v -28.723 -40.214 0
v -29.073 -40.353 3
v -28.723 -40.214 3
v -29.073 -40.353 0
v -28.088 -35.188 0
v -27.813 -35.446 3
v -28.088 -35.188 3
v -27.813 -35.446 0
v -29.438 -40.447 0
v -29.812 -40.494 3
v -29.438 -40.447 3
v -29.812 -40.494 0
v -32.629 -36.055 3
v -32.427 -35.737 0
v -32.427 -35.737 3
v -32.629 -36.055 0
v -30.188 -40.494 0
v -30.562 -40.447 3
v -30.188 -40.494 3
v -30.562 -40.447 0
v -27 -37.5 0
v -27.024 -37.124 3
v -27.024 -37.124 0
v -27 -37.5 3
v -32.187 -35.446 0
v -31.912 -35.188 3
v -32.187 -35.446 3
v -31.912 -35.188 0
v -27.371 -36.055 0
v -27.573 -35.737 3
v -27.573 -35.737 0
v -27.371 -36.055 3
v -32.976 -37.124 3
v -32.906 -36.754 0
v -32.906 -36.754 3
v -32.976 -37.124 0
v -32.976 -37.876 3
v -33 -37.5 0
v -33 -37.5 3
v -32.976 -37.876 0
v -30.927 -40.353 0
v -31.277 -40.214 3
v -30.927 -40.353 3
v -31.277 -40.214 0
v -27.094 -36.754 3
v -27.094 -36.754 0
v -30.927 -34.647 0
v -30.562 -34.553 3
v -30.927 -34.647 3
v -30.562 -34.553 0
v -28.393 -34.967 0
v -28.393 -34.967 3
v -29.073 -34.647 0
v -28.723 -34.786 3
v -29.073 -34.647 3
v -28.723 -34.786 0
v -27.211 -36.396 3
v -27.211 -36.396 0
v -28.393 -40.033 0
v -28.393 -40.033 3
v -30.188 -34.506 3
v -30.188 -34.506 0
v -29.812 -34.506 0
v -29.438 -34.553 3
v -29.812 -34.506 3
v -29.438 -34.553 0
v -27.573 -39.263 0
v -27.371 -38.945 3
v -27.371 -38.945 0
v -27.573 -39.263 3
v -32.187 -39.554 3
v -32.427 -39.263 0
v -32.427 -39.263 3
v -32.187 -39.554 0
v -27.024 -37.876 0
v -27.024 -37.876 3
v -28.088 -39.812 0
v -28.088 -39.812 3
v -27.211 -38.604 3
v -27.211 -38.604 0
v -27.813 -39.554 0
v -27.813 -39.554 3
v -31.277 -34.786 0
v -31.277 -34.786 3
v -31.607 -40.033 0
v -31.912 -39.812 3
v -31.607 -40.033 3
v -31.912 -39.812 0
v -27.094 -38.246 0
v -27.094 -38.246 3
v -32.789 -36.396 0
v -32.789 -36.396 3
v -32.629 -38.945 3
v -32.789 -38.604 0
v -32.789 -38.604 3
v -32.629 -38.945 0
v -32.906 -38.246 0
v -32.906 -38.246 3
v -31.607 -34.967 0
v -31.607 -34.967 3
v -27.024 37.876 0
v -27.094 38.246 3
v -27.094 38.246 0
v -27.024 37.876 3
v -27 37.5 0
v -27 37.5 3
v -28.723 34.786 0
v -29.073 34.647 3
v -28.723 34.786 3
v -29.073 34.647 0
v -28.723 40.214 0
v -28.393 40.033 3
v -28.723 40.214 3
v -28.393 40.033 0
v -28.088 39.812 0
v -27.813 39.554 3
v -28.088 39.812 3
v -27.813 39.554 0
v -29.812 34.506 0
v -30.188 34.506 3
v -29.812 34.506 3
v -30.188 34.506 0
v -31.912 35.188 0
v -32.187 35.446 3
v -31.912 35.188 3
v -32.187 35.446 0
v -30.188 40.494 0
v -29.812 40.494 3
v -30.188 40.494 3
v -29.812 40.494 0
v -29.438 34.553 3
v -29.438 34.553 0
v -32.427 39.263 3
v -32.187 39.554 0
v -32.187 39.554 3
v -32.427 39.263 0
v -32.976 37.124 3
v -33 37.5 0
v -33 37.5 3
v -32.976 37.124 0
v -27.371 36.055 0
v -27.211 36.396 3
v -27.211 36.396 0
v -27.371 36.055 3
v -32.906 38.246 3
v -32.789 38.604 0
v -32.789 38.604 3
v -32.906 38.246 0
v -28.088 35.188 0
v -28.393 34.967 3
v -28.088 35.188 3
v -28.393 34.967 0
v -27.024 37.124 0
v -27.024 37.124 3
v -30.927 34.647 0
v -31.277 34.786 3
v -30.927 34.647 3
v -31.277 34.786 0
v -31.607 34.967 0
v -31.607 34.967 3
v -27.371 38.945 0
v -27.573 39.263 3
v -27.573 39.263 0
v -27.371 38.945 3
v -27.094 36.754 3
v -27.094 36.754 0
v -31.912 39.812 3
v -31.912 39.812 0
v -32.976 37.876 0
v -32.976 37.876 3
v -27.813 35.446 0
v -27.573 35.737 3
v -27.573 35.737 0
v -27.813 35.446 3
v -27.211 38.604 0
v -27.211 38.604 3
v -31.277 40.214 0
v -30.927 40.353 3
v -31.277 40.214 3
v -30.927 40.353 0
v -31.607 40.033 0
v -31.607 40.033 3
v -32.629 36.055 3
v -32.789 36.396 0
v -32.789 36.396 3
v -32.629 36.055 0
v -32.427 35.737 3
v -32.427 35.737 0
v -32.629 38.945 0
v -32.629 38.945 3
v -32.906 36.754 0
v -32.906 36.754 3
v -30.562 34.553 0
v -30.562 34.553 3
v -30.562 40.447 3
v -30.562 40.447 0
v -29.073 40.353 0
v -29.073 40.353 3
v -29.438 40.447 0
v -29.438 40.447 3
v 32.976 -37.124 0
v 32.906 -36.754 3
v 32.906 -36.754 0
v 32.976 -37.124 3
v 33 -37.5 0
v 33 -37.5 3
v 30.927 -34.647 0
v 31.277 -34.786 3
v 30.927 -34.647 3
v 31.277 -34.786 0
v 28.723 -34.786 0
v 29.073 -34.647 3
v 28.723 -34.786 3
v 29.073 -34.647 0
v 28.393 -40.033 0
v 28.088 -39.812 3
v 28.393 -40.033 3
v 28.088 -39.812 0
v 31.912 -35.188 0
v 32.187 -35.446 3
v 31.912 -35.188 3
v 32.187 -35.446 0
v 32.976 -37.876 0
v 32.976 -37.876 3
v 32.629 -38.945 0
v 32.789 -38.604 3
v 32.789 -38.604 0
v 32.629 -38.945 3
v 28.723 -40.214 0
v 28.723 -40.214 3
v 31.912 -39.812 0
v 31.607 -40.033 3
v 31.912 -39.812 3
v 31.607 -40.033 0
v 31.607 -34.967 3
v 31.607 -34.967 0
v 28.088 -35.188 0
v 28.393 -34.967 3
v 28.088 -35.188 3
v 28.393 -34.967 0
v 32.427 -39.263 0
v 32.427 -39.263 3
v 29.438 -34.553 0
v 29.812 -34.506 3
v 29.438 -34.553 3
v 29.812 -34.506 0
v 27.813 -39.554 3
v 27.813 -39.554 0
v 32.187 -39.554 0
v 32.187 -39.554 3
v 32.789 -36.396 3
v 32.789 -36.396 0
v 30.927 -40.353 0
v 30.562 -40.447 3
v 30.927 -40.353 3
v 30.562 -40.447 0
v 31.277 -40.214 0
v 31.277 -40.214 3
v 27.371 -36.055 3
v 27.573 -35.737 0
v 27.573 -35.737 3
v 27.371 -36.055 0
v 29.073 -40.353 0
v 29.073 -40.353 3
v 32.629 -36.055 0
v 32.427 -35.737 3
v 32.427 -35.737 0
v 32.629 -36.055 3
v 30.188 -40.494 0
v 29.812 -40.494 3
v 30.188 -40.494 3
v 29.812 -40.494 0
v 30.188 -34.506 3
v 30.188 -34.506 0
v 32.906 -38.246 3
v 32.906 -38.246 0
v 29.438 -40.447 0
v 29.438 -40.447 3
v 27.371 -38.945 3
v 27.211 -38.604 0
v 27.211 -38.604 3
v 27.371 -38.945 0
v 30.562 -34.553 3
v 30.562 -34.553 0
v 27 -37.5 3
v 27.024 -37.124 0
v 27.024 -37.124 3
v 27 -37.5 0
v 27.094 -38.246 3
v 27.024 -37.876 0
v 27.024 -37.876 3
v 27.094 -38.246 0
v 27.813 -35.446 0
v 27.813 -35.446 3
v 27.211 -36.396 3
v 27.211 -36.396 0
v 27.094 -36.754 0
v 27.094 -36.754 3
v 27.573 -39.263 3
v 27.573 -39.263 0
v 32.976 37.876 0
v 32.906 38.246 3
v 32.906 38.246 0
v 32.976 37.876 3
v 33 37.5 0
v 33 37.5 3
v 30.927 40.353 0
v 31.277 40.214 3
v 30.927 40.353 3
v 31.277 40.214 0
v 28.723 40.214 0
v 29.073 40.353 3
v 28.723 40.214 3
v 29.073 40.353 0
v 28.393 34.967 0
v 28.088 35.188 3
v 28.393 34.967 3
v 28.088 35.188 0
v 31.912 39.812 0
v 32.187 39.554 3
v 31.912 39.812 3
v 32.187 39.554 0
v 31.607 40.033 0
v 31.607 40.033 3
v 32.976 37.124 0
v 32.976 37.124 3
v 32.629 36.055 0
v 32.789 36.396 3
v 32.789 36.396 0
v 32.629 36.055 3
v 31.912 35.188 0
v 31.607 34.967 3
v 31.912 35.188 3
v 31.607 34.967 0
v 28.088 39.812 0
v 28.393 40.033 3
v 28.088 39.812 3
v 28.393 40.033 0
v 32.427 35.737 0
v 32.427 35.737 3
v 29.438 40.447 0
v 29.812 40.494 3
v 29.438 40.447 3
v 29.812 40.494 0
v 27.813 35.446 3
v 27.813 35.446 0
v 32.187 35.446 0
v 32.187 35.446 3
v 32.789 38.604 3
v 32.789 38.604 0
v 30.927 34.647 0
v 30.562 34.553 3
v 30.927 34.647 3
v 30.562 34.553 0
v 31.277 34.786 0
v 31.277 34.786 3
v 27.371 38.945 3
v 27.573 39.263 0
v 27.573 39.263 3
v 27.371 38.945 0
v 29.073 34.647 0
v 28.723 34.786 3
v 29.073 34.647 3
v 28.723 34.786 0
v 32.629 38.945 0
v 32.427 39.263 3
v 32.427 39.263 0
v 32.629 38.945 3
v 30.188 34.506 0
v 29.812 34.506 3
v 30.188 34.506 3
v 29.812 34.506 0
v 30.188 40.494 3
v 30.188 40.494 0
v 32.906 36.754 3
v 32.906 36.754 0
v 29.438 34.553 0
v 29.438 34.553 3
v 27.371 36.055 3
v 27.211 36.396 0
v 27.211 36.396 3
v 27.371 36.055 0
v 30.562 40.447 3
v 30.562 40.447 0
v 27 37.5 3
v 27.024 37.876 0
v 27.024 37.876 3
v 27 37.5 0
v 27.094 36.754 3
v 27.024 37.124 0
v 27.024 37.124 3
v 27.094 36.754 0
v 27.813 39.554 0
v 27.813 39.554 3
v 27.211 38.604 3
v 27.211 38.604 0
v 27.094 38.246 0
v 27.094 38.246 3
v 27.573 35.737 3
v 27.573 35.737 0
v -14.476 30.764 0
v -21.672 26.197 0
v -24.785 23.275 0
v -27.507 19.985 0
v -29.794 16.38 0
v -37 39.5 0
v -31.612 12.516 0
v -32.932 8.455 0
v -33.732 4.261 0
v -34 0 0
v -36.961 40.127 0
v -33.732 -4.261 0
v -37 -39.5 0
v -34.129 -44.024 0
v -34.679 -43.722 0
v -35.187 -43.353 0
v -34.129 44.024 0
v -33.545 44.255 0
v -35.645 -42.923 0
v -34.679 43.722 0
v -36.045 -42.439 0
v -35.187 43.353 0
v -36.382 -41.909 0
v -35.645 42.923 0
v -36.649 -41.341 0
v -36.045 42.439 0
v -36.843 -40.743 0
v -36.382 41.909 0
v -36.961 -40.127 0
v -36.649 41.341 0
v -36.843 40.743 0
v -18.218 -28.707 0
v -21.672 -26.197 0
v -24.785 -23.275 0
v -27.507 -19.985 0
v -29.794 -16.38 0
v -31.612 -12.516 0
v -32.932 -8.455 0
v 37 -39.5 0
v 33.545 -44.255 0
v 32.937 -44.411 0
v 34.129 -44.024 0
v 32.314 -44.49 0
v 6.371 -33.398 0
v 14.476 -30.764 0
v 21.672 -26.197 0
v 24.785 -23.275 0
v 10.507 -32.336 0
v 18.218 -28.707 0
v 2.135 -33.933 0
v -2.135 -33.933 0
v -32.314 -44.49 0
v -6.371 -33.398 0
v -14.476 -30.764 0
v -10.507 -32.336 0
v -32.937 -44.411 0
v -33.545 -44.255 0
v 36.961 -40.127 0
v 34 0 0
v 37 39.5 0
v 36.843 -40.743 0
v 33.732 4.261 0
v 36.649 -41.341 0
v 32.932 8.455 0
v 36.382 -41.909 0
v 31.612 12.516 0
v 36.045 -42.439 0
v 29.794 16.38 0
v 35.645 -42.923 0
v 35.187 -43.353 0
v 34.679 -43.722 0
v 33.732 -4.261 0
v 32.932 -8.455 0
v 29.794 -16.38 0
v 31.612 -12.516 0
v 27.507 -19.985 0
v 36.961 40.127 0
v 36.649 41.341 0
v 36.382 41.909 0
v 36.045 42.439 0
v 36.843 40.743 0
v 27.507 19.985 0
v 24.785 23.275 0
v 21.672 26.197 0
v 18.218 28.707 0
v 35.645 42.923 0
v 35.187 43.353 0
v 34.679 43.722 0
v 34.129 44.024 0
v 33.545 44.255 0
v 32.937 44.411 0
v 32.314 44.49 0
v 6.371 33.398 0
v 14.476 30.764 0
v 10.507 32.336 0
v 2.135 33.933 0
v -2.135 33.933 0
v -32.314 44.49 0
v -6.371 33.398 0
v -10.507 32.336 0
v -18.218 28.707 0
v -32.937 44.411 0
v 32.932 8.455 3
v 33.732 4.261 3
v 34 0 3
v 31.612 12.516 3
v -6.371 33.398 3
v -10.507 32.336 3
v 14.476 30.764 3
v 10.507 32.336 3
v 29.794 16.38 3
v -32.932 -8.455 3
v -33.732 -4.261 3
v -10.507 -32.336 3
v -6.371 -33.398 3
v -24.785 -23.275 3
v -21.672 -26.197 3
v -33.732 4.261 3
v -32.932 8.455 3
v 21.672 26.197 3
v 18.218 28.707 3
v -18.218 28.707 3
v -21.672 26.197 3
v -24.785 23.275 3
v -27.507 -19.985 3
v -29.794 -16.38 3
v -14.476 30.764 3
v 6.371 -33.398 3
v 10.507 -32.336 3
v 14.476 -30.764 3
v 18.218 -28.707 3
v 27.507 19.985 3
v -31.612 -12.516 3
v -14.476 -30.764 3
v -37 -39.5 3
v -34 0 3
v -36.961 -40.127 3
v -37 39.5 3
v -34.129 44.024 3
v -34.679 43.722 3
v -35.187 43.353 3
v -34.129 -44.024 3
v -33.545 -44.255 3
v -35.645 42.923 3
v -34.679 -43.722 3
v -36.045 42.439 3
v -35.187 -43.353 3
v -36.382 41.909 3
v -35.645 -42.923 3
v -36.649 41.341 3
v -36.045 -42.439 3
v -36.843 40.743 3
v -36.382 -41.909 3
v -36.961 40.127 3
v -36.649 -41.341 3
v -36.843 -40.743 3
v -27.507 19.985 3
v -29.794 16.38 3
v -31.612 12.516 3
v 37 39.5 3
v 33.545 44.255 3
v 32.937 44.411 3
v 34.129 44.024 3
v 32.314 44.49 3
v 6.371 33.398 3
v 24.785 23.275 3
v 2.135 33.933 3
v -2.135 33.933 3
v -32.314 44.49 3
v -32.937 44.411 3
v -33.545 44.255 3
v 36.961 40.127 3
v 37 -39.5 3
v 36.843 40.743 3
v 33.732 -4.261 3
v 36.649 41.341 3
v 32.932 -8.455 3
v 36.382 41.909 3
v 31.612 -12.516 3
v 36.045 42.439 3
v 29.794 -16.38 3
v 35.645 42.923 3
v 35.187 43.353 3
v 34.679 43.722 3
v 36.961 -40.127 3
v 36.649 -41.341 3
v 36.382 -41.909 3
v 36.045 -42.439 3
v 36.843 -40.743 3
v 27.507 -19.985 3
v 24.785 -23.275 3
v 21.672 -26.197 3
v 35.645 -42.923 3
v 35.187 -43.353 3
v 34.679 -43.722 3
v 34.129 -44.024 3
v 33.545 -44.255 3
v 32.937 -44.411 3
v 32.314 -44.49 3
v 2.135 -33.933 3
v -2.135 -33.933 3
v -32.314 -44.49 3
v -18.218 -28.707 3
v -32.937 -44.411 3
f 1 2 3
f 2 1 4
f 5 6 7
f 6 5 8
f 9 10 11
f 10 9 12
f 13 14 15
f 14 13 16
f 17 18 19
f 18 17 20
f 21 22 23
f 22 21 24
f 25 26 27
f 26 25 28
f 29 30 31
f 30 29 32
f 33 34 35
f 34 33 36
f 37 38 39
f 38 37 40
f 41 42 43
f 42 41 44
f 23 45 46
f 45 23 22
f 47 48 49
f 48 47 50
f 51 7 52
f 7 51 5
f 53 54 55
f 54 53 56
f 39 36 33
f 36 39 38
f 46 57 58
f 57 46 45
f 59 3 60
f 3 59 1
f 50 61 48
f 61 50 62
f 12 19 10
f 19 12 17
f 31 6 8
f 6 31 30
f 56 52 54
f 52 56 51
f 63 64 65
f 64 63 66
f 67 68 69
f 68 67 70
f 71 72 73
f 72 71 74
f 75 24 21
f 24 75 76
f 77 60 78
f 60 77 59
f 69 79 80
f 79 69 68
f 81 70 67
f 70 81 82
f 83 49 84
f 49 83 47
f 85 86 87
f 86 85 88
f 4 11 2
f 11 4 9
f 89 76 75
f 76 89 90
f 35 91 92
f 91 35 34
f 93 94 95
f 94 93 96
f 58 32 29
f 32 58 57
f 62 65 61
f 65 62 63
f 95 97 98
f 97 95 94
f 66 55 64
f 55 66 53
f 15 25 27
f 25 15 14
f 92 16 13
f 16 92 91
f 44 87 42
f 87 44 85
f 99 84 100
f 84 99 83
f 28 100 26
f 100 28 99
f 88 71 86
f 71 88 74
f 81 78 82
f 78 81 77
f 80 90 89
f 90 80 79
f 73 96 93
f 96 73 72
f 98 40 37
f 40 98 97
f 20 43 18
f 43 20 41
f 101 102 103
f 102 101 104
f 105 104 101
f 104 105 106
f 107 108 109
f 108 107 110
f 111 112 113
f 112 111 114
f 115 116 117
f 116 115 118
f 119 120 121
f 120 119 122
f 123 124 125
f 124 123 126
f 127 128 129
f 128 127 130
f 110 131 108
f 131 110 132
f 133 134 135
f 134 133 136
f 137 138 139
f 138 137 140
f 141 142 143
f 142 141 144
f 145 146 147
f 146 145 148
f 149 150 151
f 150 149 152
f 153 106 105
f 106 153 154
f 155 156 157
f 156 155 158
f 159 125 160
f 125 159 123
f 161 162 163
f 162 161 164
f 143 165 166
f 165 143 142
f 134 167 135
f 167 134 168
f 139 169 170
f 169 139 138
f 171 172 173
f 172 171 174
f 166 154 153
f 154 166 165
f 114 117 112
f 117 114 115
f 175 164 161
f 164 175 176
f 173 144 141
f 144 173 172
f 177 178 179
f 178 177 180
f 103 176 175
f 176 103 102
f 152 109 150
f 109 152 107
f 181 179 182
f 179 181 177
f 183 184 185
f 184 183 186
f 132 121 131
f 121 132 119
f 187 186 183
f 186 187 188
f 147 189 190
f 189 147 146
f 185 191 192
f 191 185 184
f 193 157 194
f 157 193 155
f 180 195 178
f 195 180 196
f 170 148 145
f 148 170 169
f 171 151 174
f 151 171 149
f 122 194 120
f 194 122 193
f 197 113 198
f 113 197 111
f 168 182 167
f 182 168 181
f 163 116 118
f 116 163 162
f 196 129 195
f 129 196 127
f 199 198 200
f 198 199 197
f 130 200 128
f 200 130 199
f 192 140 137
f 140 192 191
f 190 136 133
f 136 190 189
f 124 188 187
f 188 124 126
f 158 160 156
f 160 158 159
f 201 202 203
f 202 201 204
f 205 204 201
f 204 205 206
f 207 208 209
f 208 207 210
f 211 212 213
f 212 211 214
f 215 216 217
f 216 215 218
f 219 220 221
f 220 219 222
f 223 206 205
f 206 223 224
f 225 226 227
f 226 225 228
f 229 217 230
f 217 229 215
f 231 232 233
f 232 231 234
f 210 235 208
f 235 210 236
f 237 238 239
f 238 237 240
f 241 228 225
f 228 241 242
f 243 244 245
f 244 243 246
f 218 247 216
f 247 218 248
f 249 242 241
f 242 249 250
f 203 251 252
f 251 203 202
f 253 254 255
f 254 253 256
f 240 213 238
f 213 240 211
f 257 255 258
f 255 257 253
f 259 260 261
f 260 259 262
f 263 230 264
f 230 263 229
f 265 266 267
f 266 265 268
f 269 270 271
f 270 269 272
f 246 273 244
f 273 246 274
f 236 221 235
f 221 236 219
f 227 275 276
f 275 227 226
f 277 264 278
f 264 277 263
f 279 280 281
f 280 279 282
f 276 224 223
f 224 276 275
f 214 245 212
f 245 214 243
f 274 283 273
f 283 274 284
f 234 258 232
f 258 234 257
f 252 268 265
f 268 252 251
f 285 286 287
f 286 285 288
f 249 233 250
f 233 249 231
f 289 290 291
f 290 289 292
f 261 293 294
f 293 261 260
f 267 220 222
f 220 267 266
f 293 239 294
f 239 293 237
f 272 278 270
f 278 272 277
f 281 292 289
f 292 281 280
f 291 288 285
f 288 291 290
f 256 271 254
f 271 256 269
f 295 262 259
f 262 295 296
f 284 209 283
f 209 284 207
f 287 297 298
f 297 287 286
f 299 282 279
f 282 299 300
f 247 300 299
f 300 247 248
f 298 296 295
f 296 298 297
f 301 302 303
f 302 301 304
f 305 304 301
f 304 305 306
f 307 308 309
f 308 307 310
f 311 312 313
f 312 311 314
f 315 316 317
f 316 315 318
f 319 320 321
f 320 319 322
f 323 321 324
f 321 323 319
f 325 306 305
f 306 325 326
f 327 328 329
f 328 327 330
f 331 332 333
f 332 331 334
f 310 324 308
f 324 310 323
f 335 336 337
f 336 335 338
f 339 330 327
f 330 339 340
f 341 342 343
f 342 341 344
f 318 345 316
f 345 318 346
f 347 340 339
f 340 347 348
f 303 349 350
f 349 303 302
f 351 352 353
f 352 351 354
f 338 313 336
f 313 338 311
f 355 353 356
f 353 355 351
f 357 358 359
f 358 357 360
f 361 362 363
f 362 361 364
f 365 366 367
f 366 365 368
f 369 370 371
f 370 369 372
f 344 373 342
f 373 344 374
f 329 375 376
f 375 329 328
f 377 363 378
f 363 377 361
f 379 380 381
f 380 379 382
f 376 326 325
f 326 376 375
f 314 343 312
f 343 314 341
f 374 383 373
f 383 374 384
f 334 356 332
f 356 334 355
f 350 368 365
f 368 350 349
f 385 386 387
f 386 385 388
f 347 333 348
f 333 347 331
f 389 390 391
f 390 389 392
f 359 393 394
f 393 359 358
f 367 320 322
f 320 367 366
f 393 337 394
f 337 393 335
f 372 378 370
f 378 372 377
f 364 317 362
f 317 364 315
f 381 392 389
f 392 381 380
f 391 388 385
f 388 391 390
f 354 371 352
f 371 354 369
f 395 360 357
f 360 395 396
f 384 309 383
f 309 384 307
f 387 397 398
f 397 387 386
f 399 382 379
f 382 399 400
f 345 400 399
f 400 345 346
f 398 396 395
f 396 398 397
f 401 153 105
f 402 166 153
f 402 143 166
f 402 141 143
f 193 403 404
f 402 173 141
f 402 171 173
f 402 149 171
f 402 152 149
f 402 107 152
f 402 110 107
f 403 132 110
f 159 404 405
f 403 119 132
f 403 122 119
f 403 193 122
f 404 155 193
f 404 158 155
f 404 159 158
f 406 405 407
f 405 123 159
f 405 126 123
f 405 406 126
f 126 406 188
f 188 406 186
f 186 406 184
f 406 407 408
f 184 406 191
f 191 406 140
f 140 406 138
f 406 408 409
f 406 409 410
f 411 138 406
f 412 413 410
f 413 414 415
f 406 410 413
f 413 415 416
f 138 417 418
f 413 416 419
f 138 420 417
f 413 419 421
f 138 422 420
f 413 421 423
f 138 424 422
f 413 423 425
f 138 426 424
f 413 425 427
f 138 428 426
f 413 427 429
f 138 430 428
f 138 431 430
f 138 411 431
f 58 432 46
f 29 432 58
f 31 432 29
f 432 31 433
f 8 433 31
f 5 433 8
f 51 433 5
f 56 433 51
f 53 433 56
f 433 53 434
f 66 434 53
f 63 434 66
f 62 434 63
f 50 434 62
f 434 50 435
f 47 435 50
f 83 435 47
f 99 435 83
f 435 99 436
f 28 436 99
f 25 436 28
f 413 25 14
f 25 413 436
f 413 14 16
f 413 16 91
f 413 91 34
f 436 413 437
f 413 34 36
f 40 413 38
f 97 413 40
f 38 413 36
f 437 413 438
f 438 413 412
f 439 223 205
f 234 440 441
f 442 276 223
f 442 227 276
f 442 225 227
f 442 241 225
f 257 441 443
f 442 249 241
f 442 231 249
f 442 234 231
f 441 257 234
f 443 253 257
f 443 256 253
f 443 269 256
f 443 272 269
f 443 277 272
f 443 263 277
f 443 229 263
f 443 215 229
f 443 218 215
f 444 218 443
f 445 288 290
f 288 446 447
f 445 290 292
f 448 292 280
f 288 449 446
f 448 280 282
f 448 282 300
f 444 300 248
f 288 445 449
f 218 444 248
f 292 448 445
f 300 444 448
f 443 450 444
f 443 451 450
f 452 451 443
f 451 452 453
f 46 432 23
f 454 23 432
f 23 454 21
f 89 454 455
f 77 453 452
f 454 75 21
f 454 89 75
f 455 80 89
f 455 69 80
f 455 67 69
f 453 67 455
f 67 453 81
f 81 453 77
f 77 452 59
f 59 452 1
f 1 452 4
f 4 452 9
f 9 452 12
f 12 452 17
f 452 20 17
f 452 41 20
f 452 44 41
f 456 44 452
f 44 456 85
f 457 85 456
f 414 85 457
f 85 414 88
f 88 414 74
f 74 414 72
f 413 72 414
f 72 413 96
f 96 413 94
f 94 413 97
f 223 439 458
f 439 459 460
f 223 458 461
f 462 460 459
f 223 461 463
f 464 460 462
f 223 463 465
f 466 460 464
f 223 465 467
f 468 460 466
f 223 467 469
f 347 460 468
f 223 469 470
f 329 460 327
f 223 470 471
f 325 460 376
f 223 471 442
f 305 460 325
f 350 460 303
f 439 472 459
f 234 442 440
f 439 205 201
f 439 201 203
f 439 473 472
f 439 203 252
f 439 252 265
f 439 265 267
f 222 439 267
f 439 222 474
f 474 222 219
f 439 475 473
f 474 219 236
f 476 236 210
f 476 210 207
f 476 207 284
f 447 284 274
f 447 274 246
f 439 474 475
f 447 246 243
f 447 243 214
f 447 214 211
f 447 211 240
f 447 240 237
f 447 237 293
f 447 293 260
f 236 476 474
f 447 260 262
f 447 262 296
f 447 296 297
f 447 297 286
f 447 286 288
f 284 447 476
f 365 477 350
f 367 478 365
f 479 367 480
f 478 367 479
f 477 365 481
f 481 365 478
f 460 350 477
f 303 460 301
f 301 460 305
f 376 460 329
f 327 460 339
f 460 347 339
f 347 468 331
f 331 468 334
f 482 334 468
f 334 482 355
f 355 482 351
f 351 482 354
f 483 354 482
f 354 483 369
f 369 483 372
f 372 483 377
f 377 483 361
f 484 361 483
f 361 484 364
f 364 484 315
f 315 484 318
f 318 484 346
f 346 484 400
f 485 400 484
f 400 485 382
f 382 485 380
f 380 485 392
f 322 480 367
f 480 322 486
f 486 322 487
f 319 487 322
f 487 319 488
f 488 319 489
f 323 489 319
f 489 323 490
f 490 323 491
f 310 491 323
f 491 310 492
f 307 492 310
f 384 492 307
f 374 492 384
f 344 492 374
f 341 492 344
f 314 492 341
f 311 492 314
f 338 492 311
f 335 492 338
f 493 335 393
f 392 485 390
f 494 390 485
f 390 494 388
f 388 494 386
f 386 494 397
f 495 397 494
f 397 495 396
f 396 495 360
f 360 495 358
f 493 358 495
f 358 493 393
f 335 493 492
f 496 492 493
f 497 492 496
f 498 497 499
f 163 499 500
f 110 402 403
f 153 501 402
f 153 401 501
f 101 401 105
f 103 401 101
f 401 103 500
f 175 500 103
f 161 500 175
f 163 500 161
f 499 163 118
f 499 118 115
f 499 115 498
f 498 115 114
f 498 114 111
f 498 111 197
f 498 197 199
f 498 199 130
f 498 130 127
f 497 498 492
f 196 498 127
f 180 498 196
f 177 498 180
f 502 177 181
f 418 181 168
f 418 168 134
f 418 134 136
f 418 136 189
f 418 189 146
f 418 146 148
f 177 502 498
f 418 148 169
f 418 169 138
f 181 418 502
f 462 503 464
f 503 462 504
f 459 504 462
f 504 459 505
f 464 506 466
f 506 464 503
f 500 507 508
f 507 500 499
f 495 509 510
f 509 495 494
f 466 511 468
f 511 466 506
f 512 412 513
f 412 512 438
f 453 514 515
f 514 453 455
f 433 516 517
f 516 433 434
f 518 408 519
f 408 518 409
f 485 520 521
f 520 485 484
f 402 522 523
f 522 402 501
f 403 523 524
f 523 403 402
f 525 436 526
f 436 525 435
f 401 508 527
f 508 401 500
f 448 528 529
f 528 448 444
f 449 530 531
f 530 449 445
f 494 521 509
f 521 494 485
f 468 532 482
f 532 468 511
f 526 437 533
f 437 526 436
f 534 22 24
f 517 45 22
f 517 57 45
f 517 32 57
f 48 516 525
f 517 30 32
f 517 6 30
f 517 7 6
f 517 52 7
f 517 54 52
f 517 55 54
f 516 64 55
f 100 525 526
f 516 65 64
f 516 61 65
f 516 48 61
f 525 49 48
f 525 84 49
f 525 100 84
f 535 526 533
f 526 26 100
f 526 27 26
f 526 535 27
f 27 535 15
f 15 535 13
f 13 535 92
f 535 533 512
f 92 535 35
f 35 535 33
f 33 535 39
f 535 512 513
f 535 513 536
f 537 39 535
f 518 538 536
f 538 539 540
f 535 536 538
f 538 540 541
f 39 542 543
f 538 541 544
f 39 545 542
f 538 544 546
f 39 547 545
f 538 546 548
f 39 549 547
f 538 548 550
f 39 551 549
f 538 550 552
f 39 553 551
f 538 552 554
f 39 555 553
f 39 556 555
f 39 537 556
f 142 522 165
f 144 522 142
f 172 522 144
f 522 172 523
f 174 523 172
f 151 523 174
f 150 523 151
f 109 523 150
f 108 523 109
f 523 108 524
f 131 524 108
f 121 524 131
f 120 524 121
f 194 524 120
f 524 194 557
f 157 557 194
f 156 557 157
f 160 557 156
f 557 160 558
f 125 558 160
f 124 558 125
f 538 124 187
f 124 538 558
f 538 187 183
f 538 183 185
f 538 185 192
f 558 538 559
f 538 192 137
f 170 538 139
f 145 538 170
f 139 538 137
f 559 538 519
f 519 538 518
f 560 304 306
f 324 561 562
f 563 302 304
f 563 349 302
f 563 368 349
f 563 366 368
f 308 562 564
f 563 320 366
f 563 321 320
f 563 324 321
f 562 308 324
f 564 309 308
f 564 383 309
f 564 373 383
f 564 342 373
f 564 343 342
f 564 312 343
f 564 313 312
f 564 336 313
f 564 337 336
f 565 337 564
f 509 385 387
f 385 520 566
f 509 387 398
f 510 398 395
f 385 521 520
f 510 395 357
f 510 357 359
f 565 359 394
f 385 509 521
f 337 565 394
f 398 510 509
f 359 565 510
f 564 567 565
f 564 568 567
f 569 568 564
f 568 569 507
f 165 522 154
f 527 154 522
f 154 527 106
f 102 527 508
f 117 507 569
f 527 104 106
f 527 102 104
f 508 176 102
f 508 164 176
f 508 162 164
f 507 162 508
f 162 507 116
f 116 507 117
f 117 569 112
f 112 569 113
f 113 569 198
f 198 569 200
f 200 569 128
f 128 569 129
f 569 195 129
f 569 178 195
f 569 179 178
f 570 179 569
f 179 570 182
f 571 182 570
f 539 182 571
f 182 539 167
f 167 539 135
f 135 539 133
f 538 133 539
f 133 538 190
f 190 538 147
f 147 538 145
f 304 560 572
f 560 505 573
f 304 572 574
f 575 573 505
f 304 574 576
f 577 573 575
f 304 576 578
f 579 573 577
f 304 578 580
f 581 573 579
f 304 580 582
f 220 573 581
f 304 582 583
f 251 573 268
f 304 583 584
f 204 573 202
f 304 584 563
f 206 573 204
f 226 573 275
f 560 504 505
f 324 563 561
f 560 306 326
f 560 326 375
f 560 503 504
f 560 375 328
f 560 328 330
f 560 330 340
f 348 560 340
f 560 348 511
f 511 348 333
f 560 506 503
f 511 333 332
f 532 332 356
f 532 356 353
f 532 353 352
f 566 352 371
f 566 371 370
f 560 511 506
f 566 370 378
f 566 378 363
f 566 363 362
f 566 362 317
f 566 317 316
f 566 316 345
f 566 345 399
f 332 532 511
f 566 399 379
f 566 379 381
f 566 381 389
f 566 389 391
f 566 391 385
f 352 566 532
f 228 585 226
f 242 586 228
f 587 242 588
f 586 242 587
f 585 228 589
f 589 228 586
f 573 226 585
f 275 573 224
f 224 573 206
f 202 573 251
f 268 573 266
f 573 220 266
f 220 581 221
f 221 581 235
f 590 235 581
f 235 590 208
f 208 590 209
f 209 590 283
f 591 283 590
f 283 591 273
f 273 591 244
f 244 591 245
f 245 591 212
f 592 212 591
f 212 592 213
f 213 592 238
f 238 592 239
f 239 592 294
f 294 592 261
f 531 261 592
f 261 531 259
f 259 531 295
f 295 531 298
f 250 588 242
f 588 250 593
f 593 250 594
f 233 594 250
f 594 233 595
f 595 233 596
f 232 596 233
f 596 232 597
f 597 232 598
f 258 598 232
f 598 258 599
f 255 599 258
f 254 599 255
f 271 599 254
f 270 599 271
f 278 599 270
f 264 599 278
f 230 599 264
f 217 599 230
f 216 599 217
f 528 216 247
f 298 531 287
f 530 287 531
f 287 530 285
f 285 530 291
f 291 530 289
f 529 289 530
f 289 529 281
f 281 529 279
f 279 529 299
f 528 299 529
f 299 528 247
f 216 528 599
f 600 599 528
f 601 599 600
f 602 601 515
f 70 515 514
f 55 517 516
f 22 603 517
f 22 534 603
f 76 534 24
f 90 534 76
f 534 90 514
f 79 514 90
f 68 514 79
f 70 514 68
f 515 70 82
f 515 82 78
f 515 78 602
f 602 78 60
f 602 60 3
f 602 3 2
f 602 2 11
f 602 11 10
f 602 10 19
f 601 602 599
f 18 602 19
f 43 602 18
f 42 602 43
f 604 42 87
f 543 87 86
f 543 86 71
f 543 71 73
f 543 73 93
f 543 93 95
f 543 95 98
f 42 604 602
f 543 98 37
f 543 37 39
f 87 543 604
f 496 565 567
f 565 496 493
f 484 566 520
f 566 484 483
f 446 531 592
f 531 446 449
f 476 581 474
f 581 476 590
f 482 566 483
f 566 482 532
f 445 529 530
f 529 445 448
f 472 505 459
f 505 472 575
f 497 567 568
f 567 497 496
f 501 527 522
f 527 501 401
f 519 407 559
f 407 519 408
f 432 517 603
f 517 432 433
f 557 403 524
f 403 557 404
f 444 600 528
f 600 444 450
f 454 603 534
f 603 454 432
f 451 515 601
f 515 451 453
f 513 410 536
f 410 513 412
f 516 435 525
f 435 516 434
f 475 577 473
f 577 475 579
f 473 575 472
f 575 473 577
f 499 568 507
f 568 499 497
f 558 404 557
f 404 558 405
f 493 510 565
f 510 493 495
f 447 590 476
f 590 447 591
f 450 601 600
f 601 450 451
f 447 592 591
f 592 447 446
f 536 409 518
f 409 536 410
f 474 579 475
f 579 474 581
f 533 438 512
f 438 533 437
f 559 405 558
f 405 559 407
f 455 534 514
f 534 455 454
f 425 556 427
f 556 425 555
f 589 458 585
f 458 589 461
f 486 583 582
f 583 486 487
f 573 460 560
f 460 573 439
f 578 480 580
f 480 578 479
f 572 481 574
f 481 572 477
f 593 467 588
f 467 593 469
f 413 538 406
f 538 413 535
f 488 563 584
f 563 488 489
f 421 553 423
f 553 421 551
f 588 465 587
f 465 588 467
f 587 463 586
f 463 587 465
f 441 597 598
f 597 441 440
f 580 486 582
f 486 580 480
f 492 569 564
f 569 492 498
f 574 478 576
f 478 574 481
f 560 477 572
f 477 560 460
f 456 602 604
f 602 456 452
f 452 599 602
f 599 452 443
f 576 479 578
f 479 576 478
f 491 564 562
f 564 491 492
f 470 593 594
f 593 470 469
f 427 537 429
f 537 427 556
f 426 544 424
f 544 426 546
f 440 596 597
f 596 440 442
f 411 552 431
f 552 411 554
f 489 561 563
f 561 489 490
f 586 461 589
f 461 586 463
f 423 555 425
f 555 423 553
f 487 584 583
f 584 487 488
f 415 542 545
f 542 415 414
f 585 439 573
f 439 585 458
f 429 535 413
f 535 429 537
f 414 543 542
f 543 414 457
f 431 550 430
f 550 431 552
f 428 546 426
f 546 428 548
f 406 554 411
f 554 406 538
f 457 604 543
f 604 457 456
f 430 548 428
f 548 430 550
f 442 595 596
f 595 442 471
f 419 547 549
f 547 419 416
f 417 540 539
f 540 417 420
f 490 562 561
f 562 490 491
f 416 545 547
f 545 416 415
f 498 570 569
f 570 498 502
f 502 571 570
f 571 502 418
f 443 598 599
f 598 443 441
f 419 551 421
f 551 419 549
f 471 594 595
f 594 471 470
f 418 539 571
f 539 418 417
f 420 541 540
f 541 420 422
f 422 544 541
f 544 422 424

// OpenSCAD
$fn = 50;


difference() {
	union() {
		hull() {
			translate(v = [-32.0000000000, 39.5000000000, 0]) {
				cylinder(h = 3, r = 5);
			}
			translate(v = [32.0000000000, 39.5000000000, 0]) {
				cylinder(h = 3, r = 5);
			}
			translate(v = [-32.0000000000, -39.5000000000, 0]) {
				cylinder(h = 3, r = 5);
			}
			translate(v = [32.0000000000, -39.5000000000, 0]) {
				cylinder(h = 3, r = 5);
			}
		}
	}
	union() {
		#translate(v = [-30.0000000000, -37.5000000000, -100.0000000000]) {
			cylinder(h = 200, r = 3.0000000000);
		}
		#translate(v = [-30.0000000000, 37.5000000000, -100.0000000000]) {
			cylinder(h = 200, r = 3.0000000000);
		}
		#translate(v = [30.0000000000, -37.5000000000, -100.0000000000]) {
			cylinder(h = 200, r = 3.0000000000);
		}
		#translate(v = [30.0000000000, 37.5000000000, -100.0000000000]) {
			cylinder(h = 200, r = 3.0000000000);
		}
		#cylinder(h = 3, r = 34.0000000000);
	}
}
